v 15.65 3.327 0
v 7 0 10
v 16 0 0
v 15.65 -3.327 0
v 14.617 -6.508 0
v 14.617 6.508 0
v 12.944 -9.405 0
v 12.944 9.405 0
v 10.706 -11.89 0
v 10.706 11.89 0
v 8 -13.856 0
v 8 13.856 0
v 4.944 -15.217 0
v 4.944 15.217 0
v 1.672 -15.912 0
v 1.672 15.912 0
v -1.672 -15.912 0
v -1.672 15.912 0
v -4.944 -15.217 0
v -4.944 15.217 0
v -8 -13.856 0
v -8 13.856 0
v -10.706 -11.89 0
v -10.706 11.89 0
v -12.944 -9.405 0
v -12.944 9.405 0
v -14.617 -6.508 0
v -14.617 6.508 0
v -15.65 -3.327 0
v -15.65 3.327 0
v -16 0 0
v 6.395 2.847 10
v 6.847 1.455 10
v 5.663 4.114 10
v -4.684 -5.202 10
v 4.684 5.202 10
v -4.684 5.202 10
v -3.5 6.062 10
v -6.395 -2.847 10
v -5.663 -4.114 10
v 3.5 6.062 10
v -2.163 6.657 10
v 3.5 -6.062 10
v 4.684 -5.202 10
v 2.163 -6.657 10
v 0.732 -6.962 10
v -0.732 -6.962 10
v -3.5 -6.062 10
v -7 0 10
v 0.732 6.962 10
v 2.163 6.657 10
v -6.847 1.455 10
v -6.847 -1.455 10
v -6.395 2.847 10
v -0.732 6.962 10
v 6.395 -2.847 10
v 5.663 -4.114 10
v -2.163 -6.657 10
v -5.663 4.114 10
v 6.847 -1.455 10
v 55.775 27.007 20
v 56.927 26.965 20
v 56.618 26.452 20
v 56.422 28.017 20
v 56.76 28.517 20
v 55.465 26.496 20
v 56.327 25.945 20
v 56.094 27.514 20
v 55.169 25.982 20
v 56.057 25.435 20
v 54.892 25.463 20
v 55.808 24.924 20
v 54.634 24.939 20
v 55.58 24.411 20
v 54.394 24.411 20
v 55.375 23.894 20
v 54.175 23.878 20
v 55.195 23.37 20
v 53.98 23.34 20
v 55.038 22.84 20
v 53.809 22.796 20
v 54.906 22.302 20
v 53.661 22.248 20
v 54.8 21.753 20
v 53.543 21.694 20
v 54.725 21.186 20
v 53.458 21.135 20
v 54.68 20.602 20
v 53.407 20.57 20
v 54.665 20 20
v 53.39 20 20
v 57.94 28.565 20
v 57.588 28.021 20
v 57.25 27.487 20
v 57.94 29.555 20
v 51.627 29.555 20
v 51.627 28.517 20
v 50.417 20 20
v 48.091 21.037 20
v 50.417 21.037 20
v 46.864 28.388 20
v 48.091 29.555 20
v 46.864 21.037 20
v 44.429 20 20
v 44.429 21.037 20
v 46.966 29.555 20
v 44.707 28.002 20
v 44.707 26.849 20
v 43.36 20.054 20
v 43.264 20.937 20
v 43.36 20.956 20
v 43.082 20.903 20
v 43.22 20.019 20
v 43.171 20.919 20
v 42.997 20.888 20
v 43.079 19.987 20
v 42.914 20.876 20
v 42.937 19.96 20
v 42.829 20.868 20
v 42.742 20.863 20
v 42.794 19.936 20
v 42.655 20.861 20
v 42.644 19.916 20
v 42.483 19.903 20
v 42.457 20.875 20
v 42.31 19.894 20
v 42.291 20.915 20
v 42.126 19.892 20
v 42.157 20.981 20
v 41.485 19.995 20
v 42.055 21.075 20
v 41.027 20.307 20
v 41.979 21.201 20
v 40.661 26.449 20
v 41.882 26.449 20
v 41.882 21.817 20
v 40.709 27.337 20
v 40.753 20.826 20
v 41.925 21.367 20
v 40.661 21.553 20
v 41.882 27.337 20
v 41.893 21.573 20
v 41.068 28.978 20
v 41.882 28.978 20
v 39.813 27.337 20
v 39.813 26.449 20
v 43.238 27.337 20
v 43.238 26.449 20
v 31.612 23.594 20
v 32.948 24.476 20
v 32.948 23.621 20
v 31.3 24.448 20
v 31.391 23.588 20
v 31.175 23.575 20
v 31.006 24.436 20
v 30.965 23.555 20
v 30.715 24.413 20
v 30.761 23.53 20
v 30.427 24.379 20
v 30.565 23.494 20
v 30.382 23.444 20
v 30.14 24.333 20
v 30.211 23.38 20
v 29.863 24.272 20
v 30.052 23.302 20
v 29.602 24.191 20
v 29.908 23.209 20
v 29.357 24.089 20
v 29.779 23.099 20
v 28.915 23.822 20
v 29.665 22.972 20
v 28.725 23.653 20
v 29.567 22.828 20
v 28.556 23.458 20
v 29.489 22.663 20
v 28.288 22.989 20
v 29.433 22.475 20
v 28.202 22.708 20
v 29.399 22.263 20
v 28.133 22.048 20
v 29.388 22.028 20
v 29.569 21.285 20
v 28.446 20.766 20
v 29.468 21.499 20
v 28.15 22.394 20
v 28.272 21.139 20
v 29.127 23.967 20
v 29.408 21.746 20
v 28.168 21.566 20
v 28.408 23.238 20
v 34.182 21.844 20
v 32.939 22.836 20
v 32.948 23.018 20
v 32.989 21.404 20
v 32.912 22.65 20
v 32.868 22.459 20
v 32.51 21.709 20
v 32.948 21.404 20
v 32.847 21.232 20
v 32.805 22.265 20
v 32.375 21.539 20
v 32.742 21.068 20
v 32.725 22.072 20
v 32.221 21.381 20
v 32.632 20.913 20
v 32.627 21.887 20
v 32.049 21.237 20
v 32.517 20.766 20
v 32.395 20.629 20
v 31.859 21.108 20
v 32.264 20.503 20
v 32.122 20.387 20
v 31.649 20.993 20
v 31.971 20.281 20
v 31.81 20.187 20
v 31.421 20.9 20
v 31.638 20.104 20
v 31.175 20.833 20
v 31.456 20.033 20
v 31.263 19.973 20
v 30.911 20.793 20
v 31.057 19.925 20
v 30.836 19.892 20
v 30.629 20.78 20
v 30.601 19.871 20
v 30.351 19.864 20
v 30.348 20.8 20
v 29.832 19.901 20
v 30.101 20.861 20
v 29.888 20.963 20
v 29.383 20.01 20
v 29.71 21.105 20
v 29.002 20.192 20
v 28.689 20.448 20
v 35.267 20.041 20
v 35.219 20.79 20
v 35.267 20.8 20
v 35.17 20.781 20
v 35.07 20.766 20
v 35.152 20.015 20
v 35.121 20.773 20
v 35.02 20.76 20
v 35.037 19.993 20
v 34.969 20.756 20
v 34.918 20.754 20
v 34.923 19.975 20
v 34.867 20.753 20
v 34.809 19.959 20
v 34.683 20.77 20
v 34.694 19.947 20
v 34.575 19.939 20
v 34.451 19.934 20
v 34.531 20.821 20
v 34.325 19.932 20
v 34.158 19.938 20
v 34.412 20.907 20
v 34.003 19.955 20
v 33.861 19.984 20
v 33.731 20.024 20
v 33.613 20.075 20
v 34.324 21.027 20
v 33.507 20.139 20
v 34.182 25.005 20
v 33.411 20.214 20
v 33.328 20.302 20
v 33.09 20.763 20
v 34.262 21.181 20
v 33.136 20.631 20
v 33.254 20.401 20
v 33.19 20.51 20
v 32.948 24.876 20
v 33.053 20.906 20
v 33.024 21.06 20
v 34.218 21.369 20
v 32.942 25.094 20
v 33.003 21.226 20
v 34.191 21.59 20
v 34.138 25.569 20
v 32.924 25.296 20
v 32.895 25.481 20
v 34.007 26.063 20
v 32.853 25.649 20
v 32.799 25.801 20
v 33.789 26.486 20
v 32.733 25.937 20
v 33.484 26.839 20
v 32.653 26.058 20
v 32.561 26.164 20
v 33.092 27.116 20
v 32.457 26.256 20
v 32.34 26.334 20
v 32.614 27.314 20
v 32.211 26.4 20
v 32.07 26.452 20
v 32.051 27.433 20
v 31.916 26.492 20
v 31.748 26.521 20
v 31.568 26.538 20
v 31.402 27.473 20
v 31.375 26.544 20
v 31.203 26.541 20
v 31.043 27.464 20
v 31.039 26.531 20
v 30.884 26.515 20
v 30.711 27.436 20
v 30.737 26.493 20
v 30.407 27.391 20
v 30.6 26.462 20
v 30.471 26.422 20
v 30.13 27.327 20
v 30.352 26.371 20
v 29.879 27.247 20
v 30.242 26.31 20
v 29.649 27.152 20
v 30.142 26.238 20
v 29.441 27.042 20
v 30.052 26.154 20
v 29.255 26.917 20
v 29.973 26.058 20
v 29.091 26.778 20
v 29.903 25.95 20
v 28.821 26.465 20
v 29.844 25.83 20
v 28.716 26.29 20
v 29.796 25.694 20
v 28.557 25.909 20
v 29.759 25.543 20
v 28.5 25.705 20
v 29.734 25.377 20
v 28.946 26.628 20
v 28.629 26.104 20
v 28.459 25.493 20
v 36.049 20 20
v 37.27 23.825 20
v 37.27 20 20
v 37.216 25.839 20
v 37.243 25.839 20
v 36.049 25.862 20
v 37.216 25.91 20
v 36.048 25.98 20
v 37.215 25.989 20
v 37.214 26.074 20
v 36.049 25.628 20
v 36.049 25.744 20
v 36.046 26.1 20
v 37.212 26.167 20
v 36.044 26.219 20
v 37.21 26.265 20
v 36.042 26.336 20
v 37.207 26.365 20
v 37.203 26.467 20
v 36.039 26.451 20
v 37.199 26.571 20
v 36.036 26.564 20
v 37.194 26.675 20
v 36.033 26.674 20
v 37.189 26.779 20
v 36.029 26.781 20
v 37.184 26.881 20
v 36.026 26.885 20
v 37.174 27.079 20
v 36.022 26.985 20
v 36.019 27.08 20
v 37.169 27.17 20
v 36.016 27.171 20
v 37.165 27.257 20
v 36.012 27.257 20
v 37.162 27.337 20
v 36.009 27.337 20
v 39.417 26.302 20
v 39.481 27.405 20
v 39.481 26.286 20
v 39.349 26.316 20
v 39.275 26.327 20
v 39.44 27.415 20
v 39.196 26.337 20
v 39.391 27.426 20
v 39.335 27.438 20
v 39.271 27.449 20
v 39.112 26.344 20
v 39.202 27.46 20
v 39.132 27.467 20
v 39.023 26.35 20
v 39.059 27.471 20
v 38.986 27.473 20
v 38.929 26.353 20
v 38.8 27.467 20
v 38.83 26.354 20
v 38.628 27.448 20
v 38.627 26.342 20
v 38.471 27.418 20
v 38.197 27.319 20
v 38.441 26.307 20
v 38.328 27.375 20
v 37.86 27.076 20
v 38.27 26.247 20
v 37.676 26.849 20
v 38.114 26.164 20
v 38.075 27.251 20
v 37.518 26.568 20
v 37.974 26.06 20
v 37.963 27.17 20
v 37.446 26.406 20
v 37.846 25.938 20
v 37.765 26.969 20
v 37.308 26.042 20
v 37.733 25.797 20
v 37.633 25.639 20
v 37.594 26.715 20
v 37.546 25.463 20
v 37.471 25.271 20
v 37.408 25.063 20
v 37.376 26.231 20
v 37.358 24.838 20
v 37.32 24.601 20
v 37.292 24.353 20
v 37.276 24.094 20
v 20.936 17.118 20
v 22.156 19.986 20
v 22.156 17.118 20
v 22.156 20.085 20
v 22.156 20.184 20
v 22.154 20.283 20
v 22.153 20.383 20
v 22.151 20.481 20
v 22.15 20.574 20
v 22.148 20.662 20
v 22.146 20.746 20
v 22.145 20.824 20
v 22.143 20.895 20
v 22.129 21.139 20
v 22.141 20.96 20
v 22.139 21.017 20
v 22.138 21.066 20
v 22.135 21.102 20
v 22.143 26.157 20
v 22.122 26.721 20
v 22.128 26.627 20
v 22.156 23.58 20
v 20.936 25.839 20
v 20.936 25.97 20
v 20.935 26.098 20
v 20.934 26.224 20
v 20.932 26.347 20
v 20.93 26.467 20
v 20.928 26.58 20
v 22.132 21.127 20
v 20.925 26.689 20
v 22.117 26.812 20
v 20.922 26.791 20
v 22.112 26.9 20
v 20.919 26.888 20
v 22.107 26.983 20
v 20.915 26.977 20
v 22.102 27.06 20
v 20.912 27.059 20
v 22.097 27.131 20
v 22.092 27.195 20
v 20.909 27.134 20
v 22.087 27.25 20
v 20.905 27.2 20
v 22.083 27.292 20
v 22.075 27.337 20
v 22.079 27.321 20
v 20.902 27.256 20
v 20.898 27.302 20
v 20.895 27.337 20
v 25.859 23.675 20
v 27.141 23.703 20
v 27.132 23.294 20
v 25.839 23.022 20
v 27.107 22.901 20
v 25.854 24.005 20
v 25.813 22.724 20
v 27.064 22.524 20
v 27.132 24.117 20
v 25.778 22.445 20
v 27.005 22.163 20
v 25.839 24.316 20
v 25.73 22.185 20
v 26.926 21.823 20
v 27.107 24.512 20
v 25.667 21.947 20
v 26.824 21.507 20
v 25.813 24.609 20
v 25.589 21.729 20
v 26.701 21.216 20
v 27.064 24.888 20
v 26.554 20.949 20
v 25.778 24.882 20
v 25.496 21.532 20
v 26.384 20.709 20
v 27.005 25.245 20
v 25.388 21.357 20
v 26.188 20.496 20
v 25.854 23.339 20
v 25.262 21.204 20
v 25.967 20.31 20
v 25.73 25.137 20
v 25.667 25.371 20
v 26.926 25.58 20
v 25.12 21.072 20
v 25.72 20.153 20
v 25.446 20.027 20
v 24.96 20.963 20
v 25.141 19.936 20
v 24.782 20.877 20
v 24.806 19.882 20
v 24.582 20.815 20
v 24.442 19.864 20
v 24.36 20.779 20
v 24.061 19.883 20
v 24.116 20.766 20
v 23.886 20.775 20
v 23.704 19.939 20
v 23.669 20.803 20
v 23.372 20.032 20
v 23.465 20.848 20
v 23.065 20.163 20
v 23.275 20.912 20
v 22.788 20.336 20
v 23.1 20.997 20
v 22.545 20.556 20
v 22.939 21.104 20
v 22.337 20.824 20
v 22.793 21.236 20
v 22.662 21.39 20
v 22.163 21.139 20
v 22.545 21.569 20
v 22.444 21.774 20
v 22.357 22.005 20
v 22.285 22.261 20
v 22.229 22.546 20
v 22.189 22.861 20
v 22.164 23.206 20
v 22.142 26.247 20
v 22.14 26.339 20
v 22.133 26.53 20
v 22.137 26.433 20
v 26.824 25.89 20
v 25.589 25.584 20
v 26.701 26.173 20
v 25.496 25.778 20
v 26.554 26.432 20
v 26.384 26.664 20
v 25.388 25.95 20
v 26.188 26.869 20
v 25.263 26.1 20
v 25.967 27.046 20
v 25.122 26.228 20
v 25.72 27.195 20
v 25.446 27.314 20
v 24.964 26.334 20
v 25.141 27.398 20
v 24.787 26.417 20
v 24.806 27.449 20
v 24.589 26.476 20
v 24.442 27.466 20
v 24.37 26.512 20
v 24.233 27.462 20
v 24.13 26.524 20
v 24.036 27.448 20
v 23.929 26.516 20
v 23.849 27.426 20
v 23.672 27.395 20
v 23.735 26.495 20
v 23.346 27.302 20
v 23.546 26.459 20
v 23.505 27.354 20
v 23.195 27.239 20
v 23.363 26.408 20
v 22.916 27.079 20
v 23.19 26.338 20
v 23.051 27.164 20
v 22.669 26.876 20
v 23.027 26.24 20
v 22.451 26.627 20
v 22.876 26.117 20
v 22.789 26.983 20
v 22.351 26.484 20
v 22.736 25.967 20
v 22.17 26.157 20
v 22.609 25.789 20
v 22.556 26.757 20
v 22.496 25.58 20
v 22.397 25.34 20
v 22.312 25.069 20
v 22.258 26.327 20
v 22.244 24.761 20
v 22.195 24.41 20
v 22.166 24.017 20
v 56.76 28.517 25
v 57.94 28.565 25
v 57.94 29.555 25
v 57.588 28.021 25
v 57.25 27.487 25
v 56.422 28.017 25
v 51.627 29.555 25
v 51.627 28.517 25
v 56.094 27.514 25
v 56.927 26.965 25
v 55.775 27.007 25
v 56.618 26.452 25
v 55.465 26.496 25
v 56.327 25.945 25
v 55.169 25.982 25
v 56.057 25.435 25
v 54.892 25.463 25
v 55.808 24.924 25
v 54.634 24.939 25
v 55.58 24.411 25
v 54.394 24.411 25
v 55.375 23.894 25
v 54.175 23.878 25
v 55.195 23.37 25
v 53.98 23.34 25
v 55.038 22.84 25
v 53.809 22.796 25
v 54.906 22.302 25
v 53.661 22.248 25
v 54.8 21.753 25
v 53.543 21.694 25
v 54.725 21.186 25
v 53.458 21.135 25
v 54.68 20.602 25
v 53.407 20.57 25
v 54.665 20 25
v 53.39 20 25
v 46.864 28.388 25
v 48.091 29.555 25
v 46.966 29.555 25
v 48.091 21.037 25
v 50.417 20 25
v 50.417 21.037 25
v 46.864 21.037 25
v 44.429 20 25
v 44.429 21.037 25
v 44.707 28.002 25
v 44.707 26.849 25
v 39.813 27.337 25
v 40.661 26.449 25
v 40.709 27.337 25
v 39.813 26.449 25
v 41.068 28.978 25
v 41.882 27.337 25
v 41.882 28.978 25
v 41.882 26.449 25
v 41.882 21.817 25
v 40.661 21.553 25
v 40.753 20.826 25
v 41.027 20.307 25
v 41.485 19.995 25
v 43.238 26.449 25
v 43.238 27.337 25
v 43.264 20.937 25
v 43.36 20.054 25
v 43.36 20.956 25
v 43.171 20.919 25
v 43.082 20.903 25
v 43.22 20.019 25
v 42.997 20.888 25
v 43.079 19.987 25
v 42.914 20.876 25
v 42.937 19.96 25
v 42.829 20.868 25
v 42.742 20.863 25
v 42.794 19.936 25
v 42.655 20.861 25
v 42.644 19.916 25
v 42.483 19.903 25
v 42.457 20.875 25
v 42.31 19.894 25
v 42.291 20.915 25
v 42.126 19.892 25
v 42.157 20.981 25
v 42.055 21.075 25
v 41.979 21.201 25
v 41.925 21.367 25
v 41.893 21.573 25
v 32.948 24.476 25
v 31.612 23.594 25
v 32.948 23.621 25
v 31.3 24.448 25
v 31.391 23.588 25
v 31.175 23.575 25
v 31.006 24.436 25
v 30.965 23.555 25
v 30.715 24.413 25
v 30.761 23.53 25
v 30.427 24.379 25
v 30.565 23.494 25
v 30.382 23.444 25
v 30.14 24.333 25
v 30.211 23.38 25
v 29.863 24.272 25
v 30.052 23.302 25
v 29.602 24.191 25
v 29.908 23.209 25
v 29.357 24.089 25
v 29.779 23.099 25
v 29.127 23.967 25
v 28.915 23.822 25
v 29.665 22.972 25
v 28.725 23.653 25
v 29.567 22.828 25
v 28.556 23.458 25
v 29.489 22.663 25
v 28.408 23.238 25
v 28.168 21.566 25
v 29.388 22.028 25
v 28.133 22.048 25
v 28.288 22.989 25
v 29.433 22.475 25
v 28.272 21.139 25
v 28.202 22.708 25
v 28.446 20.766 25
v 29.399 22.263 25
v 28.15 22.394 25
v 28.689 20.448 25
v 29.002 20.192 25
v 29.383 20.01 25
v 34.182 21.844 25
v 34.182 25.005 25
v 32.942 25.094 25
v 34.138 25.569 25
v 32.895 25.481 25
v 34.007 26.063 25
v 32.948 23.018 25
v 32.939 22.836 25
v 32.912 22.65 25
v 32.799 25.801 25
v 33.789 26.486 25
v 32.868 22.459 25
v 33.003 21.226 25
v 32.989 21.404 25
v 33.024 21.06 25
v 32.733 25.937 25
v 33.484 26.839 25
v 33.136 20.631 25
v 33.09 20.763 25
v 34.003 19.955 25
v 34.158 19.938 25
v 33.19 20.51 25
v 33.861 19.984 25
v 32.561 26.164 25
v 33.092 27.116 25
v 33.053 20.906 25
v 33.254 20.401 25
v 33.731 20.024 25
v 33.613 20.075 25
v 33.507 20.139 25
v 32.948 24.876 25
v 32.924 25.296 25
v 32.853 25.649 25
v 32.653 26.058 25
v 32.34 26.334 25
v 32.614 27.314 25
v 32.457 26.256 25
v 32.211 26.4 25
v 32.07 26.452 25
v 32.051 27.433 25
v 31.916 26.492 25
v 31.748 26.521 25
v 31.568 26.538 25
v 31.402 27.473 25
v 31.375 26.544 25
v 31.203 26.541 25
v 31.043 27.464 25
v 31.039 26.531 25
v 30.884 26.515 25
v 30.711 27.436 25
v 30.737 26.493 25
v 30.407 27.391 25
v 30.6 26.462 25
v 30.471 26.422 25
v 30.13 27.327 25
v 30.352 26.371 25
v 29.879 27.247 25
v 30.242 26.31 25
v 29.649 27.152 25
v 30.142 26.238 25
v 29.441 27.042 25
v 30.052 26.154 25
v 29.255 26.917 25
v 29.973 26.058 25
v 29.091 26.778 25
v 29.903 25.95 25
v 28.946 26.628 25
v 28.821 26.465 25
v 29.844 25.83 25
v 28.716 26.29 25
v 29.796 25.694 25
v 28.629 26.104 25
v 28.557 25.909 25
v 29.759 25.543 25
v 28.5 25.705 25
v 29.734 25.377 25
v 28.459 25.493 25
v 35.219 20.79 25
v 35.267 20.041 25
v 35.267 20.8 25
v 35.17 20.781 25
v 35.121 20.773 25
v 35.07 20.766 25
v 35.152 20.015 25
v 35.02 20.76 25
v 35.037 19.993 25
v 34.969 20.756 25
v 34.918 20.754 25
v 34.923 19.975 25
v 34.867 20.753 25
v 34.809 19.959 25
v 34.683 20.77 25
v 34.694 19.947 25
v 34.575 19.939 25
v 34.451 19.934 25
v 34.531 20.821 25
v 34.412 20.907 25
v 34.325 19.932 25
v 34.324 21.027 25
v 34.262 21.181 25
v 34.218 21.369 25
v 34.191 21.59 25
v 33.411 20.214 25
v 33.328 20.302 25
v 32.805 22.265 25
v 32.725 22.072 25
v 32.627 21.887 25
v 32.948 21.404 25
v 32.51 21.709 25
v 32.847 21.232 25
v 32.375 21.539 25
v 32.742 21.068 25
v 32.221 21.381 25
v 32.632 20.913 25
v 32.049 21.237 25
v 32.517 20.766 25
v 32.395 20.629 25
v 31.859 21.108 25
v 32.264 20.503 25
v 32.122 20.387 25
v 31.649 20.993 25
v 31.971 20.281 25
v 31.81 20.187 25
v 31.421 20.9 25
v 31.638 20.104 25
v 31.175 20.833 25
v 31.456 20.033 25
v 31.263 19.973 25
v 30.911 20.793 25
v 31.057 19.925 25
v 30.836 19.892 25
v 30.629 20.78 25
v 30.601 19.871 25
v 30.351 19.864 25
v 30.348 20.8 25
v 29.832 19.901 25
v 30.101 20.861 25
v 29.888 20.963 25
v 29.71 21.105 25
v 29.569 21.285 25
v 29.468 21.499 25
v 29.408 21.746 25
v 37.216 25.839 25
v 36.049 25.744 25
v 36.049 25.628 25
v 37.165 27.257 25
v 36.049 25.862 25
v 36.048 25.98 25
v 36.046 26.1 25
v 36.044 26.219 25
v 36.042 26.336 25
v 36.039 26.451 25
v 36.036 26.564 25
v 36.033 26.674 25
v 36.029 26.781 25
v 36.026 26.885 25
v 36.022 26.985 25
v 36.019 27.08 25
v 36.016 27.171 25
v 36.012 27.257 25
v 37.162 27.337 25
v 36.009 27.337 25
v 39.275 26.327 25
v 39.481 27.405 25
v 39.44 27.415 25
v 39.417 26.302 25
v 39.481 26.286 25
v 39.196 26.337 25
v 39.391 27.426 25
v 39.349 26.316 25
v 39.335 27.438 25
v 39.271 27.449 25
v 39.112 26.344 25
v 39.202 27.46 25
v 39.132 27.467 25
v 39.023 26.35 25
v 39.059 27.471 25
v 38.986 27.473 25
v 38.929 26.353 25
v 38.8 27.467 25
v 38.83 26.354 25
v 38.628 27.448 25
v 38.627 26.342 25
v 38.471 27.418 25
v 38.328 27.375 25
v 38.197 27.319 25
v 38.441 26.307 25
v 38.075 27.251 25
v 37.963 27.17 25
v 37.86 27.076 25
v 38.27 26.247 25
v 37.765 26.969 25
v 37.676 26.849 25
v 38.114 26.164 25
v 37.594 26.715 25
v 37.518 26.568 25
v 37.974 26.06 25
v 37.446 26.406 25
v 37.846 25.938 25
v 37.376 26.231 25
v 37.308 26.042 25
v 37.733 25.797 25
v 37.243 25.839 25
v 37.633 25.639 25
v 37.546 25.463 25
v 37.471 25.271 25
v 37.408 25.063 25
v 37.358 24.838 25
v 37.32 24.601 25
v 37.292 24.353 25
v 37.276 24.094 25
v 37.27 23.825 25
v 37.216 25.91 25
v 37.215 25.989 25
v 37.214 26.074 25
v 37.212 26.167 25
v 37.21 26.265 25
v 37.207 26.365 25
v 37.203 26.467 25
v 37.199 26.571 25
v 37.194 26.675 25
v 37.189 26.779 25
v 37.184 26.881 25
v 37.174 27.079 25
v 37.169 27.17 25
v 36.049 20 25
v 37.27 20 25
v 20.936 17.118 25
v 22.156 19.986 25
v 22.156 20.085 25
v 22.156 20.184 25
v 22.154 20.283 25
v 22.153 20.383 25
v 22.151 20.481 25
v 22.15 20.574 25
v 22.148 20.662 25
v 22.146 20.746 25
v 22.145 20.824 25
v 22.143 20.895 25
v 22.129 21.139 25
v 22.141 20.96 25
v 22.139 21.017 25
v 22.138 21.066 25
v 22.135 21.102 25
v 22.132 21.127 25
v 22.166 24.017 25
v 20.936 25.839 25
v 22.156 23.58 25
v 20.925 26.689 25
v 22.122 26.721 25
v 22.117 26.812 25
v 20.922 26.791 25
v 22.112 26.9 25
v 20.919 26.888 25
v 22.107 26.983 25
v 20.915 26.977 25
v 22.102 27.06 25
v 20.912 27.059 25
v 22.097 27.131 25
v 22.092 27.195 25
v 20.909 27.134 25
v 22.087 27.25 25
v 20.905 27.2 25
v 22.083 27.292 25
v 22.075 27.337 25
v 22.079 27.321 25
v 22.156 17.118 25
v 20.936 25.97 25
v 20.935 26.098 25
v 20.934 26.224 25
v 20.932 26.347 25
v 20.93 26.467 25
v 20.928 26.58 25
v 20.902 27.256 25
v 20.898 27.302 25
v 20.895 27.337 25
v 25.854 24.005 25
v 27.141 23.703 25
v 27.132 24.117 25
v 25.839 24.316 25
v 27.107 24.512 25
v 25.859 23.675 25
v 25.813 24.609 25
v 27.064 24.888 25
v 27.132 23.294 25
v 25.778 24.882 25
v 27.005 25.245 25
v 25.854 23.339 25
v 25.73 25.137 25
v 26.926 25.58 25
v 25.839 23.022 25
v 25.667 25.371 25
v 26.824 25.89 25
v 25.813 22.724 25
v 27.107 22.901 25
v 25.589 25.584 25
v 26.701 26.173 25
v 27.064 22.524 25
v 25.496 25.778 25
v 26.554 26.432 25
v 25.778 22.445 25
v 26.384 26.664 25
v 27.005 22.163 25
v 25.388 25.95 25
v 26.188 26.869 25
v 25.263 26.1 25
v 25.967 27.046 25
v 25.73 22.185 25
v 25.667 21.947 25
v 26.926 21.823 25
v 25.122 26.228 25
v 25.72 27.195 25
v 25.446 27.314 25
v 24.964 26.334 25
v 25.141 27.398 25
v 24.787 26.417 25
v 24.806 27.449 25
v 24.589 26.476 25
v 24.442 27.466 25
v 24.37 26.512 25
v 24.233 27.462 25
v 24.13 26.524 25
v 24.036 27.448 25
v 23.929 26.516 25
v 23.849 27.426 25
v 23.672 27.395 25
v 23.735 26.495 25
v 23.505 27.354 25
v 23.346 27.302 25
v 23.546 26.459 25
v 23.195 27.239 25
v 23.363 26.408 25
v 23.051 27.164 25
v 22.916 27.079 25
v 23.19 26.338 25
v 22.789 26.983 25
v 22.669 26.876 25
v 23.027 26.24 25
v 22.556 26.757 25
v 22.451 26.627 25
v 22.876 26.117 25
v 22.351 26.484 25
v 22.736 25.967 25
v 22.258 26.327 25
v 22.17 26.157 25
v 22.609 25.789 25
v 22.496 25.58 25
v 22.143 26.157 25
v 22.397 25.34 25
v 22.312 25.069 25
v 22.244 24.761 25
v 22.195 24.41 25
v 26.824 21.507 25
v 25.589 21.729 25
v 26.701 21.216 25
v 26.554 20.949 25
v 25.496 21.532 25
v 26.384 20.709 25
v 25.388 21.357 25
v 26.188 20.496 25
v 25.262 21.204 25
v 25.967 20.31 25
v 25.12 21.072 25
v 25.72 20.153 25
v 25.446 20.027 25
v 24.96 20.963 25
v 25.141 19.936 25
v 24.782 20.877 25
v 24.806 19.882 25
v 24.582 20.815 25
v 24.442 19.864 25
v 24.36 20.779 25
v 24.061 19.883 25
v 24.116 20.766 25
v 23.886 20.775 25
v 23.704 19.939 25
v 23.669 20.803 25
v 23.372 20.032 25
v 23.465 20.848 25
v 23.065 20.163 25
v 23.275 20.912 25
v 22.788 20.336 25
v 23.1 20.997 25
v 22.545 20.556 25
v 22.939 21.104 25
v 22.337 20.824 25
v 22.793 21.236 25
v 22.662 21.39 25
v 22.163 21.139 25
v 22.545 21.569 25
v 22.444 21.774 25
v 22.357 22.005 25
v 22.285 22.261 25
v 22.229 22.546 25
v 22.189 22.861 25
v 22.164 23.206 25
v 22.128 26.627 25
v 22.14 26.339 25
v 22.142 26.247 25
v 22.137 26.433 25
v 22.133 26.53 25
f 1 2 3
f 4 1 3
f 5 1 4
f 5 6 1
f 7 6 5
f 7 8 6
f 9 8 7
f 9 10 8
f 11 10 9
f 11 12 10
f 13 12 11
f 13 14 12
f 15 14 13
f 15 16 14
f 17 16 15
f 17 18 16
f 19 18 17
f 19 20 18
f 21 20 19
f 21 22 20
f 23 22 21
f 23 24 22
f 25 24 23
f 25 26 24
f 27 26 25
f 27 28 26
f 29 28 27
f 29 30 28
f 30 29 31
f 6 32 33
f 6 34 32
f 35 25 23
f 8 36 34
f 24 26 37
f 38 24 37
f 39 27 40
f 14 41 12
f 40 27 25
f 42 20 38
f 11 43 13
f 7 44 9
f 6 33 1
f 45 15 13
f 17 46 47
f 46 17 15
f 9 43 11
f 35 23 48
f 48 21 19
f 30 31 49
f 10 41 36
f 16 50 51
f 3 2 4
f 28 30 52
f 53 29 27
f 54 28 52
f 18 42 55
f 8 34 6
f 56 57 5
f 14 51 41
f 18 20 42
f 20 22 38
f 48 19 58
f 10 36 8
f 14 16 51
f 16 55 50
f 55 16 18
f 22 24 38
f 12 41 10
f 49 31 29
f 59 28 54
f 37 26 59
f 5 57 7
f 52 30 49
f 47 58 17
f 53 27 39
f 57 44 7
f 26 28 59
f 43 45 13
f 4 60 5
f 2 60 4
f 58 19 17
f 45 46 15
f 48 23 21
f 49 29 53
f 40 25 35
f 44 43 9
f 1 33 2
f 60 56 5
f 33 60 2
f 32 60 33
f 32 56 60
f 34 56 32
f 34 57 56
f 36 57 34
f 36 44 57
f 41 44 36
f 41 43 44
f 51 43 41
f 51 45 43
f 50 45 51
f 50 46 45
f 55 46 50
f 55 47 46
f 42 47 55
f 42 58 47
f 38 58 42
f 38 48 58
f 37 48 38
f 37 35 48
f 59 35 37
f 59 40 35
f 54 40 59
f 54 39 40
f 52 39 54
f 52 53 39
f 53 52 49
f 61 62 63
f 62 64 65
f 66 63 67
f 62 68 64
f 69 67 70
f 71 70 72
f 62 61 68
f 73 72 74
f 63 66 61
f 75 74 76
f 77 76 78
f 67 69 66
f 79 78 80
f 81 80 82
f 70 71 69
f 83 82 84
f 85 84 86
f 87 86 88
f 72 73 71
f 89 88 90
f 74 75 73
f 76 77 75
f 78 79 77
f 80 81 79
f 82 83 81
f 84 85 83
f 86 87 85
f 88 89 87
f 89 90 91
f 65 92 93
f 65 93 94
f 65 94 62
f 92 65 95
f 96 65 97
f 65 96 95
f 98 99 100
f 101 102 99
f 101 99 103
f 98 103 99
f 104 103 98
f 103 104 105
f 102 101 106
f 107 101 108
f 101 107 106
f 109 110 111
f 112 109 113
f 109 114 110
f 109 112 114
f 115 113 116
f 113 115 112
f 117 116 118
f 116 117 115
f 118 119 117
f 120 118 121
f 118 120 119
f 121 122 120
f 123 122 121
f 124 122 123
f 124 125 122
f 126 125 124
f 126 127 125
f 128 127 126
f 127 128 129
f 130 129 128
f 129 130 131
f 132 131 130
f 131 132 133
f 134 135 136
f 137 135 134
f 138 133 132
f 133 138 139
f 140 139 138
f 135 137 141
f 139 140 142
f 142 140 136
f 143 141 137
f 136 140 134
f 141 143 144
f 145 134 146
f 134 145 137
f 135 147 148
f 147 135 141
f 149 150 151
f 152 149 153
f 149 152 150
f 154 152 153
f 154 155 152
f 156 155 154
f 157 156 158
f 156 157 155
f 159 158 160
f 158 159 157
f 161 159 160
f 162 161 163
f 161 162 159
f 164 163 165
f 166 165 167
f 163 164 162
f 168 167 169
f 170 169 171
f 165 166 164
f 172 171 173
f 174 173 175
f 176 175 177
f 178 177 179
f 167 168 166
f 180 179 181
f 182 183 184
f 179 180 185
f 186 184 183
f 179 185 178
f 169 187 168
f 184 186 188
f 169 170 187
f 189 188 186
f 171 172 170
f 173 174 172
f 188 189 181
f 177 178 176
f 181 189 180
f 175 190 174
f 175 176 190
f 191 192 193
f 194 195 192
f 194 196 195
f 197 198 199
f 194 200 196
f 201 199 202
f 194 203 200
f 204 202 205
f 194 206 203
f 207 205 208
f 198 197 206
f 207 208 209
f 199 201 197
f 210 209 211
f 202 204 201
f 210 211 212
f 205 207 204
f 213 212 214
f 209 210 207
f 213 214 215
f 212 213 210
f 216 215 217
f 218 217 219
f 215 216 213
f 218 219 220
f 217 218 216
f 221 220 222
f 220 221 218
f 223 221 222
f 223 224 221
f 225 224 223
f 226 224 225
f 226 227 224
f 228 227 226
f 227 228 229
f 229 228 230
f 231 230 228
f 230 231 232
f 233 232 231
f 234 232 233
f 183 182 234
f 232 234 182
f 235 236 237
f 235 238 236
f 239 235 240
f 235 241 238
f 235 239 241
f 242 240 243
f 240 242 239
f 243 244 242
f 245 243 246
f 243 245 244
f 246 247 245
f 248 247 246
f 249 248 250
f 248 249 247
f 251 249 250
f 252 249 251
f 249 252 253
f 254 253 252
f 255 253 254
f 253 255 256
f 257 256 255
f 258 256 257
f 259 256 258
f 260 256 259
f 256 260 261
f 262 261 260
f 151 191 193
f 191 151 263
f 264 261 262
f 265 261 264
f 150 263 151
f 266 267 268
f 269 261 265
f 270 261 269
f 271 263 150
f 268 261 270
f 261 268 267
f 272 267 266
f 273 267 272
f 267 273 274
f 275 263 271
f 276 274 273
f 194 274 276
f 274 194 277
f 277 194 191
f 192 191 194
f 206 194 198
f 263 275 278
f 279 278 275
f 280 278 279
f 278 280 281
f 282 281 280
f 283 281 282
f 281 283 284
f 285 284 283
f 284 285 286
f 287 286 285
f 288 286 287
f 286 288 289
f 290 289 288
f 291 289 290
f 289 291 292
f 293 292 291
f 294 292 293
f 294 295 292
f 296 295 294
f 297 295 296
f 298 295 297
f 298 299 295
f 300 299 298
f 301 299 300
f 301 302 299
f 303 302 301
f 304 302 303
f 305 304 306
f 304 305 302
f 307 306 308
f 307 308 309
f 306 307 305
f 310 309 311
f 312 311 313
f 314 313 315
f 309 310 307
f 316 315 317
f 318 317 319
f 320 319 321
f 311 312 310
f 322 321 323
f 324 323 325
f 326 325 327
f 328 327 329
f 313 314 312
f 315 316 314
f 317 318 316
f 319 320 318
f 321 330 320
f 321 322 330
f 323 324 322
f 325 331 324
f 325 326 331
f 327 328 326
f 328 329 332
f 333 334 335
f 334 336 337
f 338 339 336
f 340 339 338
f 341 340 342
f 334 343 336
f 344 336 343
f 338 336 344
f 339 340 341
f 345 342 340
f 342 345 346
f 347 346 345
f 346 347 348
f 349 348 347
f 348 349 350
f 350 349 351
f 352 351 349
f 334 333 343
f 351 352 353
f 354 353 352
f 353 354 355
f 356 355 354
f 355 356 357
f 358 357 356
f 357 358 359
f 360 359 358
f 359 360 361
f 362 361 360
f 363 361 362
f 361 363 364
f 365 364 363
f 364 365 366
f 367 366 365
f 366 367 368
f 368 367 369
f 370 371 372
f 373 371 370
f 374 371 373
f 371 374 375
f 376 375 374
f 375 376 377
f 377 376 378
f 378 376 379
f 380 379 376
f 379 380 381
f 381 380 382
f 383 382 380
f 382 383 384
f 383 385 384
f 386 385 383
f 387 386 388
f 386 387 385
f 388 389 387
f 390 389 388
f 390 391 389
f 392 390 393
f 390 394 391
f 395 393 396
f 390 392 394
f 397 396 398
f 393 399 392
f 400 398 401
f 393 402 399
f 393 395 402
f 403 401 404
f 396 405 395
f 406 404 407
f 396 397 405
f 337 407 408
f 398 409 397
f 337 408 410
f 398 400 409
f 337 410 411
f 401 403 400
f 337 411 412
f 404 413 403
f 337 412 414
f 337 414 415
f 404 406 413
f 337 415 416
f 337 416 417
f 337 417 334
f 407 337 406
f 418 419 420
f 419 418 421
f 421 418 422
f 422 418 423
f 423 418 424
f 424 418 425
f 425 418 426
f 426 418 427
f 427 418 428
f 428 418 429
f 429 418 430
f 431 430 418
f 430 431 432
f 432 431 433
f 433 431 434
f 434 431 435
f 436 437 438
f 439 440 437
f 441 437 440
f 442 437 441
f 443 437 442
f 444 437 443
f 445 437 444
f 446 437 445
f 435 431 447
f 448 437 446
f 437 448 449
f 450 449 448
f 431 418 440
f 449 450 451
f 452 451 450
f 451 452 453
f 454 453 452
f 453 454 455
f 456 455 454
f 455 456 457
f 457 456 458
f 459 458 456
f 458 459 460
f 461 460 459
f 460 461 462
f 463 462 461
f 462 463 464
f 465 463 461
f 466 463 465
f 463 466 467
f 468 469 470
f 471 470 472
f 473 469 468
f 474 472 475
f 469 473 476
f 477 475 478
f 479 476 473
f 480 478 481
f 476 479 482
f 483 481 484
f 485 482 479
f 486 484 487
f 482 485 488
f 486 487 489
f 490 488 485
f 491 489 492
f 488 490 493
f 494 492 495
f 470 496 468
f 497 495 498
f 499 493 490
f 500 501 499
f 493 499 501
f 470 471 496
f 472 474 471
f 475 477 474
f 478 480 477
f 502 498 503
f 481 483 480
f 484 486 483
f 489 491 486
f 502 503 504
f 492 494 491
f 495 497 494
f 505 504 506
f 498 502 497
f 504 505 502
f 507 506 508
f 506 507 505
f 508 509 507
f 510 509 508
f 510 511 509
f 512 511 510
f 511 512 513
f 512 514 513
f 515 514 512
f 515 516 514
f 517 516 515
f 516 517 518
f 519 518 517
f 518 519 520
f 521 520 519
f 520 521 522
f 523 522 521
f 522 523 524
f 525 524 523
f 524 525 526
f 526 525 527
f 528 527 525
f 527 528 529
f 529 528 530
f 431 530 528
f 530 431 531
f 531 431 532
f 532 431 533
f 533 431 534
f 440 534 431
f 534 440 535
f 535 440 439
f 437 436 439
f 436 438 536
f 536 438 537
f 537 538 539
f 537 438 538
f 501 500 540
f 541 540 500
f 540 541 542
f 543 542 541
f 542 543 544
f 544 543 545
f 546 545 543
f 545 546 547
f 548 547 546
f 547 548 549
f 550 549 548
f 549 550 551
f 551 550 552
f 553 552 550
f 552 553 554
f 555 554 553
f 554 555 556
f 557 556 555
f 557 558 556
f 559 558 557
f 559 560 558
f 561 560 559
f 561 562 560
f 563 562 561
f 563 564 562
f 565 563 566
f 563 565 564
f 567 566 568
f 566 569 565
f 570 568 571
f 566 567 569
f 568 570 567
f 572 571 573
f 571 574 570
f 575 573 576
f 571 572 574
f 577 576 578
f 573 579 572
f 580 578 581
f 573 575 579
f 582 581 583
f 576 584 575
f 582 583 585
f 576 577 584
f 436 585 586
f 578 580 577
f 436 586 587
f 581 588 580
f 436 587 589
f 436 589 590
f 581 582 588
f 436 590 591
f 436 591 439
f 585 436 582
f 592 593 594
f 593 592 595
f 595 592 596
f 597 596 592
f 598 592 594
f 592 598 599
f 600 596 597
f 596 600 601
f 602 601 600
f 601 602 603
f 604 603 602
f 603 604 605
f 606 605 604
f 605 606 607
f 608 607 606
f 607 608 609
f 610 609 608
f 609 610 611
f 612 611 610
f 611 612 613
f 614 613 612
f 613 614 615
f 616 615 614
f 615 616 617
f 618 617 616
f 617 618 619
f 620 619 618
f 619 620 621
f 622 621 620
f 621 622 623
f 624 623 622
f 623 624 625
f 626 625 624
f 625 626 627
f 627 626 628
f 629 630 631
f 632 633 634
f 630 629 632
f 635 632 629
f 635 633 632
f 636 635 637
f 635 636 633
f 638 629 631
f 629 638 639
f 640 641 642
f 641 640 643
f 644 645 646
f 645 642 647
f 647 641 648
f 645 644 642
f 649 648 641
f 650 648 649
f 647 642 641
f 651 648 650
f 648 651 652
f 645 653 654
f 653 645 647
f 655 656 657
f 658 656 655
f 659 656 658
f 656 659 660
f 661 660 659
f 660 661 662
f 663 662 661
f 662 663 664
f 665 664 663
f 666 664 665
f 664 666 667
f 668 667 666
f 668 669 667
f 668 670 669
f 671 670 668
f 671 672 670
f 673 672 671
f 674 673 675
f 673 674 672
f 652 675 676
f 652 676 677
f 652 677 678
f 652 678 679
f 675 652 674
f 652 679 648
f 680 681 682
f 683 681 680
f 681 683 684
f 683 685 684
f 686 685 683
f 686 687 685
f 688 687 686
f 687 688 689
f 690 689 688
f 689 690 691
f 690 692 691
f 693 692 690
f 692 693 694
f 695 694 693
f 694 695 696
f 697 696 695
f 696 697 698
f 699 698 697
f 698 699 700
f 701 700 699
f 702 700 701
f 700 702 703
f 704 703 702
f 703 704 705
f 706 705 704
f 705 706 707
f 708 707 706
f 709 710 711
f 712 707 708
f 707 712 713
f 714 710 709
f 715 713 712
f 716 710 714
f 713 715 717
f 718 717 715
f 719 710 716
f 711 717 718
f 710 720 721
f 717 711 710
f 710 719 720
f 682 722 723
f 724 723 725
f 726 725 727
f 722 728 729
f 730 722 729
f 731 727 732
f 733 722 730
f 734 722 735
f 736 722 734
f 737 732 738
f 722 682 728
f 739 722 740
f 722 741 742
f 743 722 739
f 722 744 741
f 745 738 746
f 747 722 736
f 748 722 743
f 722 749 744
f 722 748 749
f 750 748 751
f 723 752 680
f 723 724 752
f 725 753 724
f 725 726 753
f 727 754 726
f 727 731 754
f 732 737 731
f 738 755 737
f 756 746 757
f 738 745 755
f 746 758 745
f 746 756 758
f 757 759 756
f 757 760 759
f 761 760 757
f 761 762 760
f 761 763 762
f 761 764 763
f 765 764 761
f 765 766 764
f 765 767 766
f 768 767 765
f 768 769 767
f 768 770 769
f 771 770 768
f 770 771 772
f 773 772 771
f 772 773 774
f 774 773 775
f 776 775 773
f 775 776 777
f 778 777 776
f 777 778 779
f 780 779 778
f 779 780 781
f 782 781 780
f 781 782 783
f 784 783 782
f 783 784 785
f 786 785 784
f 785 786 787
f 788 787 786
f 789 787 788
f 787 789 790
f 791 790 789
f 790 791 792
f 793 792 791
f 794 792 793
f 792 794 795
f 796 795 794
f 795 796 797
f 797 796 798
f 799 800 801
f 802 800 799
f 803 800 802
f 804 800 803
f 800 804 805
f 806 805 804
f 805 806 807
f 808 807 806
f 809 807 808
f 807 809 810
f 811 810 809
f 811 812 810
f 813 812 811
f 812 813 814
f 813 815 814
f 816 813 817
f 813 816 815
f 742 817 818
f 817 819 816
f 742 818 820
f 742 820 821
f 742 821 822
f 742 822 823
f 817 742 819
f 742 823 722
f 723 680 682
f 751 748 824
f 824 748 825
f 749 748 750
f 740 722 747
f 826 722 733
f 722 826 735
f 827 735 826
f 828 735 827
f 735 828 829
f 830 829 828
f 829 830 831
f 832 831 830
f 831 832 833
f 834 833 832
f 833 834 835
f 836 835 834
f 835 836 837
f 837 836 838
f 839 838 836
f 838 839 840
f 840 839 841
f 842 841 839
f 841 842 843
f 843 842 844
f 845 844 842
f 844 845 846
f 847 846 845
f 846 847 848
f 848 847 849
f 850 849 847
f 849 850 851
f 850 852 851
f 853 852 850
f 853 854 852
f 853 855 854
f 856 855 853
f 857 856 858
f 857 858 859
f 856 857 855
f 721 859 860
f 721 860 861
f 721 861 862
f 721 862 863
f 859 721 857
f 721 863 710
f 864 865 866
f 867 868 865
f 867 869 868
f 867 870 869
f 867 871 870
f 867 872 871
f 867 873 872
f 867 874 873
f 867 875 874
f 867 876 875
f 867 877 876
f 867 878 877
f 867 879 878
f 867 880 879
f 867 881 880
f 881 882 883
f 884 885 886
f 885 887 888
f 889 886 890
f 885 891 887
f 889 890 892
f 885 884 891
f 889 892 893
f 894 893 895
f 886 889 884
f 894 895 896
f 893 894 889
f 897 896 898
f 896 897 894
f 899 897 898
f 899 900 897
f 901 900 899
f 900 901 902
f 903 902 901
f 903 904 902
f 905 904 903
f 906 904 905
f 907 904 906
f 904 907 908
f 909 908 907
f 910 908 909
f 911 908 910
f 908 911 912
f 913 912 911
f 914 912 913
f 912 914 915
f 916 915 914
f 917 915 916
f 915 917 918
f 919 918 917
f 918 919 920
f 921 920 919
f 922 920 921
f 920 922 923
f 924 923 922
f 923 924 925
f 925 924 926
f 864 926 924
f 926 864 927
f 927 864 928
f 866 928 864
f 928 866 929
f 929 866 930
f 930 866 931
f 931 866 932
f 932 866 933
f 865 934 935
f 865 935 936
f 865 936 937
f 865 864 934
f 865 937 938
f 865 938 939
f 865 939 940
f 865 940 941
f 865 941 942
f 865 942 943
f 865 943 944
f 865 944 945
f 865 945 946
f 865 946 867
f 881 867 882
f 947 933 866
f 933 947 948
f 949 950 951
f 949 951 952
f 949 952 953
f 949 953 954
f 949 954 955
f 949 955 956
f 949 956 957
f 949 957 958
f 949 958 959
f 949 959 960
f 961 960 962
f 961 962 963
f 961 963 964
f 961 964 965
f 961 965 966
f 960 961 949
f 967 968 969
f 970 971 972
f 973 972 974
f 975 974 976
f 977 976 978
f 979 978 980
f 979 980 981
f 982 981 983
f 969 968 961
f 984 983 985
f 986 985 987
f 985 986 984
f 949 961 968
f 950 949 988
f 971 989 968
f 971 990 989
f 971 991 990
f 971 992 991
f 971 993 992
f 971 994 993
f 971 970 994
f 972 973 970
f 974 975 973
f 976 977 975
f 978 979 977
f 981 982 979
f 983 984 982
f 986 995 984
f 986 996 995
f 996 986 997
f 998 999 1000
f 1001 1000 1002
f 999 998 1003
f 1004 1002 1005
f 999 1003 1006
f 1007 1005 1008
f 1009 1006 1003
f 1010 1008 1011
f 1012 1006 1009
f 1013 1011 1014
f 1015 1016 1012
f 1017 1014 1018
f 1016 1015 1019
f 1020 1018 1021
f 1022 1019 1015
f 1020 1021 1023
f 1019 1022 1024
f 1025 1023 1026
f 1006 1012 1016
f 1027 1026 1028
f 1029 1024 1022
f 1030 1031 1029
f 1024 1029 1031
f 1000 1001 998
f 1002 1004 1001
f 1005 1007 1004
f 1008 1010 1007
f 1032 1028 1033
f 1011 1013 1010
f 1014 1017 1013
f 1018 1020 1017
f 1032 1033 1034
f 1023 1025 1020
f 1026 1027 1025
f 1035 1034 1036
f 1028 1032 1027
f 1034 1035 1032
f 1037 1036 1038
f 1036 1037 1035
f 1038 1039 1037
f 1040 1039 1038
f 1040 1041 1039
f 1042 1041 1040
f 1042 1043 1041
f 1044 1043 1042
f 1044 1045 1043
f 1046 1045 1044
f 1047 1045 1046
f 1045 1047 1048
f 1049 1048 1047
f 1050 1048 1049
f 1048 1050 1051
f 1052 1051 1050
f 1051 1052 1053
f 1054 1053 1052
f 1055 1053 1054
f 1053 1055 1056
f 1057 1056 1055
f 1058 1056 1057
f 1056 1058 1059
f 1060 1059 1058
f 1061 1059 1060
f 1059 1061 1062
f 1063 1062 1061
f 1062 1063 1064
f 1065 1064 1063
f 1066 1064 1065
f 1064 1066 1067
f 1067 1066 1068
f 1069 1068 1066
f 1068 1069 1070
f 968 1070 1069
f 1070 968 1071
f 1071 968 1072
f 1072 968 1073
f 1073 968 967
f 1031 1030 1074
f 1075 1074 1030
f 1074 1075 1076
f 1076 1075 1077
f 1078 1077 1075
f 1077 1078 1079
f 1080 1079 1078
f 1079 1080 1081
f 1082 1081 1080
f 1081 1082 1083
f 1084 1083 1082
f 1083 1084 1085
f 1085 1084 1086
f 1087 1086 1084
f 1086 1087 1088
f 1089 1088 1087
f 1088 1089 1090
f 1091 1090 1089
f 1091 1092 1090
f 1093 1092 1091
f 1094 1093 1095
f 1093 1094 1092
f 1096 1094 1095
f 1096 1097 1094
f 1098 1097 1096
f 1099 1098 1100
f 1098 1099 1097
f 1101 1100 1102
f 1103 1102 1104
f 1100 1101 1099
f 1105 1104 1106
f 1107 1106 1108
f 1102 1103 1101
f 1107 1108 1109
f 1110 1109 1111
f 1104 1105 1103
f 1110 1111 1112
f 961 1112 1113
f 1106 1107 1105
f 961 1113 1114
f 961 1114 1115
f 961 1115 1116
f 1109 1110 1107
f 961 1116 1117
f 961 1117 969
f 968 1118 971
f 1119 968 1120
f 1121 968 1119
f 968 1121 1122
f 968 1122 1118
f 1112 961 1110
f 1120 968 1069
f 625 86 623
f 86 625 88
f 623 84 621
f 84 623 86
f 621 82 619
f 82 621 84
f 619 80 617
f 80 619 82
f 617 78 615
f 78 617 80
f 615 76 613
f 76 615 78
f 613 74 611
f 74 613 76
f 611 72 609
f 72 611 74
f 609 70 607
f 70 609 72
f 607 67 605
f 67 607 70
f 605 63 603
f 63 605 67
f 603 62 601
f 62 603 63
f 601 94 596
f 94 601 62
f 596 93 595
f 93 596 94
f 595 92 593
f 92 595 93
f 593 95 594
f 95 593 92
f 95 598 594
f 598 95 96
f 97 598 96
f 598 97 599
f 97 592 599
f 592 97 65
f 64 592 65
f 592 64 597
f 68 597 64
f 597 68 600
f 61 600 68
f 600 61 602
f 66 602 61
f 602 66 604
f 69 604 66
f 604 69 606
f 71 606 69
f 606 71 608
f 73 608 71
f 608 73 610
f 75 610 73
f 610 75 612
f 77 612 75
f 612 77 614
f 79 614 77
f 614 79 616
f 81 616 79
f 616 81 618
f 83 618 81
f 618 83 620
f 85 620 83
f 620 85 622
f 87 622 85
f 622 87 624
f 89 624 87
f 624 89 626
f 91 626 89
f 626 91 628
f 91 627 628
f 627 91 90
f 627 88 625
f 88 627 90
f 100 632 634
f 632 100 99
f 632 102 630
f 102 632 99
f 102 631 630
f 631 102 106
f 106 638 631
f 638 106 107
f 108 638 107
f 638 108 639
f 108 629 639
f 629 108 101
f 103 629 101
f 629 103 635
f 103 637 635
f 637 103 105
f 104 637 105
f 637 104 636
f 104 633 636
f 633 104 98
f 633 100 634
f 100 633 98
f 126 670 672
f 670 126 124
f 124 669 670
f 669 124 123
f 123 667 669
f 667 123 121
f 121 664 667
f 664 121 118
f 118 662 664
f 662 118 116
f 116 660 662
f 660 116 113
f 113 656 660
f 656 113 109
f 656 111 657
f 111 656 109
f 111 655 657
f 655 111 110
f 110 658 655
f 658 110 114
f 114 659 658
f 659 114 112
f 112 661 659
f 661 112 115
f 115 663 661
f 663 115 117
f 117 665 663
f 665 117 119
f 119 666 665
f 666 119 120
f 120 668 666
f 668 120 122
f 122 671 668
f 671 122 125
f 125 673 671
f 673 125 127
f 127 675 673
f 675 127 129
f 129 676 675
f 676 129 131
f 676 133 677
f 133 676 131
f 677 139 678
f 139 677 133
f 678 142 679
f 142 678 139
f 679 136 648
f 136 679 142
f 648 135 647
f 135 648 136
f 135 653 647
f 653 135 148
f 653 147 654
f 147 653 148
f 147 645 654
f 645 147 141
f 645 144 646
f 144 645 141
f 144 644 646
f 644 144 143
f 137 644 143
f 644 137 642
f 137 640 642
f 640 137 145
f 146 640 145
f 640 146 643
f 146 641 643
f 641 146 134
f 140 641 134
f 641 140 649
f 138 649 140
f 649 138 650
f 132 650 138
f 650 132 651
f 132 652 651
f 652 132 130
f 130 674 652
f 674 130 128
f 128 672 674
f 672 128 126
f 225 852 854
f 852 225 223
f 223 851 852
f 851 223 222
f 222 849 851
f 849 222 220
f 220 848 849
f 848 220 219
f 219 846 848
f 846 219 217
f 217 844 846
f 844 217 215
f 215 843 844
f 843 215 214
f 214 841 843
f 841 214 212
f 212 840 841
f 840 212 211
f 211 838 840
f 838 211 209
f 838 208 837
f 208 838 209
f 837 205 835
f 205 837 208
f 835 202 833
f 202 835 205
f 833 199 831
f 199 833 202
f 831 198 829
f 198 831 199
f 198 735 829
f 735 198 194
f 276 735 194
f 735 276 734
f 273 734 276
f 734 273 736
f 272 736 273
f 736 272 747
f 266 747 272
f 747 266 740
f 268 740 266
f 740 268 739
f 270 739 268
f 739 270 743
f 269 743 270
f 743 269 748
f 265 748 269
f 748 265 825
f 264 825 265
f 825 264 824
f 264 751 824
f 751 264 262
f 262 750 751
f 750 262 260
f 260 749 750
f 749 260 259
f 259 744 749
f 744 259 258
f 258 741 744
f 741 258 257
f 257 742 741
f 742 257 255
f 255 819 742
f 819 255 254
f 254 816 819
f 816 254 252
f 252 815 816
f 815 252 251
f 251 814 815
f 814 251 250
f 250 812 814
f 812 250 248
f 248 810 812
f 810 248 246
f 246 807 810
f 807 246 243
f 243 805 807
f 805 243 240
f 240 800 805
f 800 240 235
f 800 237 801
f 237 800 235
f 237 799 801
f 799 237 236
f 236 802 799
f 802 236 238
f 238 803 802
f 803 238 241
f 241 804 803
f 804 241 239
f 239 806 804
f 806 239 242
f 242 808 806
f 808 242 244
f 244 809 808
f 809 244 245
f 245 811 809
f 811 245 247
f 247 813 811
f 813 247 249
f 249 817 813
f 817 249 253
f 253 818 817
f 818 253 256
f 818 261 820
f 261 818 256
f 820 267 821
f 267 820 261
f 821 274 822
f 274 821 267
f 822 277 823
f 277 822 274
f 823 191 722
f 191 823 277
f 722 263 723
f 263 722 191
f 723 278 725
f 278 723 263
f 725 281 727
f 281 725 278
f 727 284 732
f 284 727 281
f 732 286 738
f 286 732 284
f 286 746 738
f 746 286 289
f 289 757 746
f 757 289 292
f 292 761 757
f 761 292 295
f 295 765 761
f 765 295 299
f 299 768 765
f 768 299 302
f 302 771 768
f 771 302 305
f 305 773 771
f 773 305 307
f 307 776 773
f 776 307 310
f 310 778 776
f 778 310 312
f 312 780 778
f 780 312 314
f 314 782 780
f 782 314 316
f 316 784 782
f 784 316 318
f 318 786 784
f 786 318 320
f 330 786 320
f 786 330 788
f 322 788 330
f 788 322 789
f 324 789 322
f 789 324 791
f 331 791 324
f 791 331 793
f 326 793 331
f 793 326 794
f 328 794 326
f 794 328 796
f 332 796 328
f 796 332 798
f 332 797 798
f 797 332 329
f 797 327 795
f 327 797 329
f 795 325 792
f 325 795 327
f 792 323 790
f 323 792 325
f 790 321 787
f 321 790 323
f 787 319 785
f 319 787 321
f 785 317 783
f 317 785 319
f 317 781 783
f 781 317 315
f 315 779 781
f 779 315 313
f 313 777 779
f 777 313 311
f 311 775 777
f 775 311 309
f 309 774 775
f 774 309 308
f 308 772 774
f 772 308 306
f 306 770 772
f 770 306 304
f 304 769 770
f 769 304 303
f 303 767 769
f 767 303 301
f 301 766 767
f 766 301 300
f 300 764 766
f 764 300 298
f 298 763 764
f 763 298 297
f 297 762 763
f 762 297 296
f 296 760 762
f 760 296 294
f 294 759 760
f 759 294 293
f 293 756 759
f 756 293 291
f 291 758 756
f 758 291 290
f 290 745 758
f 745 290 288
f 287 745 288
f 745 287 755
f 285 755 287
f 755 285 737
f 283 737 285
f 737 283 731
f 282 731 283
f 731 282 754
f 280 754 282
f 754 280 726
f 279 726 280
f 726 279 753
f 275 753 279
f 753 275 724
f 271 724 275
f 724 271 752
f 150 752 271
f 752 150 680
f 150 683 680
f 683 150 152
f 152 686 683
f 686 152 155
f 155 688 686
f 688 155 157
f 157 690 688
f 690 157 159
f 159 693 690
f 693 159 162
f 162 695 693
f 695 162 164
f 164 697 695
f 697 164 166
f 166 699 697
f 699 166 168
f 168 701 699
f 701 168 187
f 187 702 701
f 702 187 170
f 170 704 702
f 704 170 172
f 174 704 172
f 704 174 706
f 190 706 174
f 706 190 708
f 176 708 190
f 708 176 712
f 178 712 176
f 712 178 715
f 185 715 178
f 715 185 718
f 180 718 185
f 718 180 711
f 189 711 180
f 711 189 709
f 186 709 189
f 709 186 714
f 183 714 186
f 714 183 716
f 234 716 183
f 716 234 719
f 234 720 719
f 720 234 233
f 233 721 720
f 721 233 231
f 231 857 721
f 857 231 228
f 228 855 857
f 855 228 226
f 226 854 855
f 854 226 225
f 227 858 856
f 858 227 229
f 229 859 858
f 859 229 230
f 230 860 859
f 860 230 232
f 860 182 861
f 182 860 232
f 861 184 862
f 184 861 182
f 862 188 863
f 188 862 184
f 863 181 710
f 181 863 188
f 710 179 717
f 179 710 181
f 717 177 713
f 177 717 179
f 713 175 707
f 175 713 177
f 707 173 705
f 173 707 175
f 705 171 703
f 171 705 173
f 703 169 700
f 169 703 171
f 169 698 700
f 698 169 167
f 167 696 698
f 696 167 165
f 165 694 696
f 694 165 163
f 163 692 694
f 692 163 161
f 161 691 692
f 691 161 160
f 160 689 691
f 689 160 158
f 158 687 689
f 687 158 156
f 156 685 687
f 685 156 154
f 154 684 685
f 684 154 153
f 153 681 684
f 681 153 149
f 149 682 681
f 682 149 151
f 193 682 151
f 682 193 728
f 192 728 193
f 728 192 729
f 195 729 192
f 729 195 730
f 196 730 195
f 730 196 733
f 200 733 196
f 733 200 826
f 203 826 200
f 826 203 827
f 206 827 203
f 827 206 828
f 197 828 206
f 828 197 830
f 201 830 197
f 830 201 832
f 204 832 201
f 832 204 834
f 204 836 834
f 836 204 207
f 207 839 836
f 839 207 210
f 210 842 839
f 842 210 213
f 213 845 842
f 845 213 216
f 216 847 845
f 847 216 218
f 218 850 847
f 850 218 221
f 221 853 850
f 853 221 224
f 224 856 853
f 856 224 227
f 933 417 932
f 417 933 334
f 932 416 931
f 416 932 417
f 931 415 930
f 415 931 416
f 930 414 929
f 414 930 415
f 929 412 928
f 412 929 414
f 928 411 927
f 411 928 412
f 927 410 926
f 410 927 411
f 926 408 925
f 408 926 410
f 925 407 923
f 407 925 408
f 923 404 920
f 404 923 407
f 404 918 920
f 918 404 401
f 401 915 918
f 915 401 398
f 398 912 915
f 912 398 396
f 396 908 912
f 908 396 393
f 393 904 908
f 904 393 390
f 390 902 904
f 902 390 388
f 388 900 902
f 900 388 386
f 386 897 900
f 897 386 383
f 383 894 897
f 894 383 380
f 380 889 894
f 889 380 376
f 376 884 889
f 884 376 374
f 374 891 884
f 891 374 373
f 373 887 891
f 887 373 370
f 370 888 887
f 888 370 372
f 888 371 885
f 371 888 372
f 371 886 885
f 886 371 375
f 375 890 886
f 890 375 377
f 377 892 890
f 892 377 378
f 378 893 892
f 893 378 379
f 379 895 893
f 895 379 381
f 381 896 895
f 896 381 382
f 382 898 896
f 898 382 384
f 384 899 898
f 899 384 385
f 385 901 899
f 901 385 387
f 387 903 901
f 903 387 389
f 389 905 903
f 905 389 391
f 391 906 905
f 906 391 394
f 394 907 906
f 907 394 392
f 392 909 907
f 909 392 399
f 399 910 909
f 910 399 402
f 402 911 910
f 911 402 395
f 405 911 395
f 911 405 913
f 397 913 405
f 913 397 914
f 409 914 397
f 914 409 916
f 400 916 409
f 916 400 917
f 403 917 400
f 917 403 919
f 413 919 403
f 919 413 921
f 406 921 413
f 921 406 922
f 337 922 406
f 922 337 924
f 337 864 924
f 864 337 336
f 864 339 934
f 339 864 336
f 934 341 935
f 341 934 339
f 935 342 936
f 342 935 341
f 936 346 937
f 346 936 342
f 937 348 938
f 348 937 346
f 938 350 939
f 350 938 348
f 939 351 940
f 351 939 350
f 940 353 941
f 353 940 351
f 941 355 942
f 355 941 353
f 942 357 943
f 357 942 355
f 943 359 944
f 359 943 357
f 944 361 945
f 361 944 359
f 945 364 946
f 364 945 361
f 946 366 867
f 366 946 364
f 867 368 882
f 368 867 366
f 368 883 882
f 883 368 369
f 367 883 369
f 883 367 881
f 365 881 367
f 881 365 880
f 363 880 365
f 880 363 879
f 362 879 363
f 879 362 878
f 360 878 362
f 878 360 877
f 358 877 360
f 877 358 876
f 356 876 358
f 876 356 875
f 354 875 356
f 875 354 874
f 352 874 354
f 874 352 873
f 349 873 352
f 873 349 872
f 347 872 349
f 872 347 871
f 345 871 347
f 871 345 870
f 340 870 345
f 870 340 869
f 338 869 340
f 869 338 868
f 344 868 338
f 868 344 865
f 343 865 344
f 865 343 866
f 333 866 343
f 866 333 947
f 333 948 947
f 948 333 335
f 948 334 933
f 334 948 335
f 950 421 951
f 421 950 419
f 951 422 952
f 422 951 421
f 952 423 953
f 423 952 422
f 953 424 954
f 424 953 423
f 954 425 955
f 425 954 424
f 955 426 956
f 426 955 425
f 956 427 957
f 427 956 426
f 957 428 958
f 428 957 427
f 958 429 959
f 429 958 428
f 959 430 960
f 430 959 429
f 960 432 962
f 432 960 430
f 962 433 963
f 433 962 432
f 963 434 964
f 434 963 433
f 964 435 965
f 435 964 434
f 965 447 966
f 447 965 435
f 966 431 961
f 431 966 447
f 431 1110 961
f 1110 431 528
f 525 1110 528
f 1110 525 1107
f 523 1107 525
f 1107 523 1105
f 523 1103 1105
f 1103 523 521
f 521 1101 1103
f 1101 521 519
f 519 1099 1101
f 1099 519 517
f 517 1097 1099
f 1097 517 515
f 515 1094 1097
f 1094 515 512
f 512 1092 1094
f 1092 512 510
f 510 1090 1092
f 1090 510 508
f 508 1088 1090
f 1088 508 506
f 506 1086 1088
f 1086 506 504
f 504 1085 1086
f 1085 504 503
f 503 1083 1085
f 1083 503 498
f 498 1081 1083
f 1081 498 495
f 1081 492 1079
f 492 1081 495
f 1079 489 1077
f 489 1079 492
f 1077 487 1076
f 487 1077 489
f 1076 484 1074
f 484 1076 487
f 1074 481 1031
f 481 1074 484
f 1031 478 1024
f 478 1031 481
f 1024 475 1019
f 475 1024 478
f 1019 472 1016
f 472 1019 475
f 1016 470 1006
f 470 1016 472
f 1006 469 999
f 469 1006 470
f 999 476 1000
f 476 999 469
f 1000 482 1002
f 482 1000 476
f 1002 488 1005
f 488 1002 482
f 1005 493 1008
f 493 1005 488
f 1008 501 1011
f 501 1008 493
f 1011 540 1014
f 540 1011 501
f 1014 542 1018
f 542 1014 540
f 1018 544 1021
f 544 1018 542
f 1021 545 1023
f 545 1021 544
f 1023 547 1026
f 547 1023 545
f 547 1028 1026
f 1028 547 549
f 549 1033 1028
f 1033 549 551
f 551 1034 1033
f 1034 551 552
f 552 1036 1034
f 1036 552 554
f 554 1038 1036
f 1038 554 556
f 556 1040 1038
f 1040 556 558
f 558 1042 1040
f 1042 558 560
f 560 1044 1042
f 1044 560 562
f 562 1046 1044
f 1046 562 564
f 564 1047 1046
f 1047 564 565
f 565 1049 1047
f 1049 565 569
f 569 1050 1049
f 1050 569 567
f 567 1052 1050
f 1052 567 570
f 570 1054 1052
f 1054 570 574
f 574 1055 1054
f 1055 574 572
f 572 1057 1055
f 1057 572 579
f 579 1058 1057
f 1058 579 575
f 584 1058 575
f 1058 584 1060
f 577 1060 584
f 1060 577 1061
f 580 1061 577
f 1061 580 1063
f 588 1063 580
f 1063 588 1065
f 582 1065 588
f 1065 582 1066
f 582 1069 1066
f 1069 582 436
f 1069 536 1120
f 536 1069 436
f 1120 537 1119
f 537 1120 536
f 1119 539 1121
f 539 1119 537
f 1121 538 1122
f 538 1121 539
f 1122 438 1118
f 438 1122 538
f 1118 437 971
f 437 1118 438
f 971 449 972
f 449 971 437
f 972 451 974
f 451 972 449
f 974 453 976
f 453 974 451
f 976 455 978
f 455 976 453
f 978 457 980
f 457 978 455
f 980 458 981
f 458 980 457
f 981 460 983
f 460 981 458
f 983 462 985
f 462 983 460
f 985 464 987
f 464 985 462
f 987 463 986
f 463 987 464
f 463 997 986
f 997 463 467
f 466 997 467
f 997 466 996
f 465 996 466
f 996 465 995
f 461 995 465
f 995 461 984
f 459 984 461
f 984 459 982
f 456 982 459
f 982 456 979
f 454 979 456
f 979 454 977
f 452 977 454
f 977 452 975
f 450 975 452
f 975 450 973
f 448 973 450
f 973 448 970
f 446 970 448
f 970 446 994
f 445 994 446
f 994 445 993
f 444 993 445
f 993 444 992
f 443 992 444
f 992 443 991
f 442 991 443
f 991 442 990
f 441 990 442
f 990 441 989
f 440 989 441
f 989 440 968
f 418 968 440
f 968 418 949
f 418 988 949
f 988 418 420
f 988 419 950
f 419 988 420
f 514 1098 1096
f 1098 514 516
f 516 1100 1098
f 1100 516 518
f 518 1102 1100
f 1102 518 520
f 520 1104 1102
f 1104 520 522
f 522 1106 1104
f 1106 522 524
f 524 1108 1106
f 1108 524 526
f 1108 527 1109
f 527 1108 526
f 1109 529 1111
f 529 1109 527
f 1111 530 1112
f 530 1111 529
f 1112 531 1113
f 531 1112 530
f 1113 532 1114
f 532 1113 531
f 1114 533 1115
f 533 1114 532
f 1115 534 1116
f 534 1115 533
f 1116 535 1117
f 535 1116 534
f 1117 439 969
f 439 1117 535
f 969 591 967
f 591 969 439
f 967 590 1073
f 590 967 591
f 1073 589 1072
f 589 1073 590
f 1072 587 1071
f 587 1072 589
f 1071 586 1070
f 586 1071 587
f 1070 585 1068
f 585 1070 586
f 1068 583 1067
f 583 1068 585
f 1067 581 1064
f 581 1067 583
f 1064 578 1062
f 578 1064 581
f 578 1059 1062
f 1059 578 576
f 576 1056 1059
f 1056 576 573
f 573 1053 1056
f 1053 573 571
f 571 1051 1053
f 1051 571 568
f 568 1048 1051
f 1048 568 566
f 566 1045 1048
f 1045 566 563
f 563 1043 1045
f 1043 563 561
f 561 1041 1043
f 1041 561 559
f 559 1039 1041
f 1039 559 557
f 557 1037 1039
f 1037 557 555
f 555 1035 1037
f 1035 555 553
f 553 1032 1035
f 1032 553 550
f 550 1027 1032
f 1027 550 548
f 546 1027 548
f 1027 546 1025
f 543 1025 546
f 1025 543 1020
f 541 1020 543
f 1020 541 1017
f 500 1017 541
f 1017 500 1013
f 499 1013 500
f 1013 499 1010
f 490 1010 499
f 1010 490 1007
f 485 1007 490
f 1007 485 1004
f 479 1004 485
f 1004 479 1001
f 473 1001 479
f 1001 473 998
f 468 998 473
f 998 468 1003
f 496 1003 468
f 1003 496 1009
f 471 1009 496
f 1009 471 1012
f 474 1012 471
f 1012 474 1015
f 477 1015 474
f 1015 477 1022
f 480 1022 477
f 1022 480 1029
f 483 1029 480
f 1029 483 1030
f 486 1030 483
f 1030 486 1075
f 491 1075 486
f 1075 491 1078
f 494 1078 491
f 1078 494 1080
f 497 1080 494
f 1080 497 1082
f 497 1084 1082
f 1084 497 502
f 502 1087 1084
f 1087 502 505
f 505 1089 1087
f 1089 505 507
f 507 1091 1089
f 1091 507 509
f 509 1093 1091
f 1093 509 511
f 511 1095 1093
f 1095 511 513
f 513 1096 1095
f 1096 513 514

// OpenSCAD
//[CUSTOMIZATION]
// Height
h=10;
// Radius 1
r1=16;
// Radius 2
r2=7;
// Message
txt="part17";
module __END_CUSTOMIZATIONS () { }
cylinder(h,r1,r2);
translate([20,20,20]) { linear_extrude(5) text(txt, font="Liberation Sans"); }
